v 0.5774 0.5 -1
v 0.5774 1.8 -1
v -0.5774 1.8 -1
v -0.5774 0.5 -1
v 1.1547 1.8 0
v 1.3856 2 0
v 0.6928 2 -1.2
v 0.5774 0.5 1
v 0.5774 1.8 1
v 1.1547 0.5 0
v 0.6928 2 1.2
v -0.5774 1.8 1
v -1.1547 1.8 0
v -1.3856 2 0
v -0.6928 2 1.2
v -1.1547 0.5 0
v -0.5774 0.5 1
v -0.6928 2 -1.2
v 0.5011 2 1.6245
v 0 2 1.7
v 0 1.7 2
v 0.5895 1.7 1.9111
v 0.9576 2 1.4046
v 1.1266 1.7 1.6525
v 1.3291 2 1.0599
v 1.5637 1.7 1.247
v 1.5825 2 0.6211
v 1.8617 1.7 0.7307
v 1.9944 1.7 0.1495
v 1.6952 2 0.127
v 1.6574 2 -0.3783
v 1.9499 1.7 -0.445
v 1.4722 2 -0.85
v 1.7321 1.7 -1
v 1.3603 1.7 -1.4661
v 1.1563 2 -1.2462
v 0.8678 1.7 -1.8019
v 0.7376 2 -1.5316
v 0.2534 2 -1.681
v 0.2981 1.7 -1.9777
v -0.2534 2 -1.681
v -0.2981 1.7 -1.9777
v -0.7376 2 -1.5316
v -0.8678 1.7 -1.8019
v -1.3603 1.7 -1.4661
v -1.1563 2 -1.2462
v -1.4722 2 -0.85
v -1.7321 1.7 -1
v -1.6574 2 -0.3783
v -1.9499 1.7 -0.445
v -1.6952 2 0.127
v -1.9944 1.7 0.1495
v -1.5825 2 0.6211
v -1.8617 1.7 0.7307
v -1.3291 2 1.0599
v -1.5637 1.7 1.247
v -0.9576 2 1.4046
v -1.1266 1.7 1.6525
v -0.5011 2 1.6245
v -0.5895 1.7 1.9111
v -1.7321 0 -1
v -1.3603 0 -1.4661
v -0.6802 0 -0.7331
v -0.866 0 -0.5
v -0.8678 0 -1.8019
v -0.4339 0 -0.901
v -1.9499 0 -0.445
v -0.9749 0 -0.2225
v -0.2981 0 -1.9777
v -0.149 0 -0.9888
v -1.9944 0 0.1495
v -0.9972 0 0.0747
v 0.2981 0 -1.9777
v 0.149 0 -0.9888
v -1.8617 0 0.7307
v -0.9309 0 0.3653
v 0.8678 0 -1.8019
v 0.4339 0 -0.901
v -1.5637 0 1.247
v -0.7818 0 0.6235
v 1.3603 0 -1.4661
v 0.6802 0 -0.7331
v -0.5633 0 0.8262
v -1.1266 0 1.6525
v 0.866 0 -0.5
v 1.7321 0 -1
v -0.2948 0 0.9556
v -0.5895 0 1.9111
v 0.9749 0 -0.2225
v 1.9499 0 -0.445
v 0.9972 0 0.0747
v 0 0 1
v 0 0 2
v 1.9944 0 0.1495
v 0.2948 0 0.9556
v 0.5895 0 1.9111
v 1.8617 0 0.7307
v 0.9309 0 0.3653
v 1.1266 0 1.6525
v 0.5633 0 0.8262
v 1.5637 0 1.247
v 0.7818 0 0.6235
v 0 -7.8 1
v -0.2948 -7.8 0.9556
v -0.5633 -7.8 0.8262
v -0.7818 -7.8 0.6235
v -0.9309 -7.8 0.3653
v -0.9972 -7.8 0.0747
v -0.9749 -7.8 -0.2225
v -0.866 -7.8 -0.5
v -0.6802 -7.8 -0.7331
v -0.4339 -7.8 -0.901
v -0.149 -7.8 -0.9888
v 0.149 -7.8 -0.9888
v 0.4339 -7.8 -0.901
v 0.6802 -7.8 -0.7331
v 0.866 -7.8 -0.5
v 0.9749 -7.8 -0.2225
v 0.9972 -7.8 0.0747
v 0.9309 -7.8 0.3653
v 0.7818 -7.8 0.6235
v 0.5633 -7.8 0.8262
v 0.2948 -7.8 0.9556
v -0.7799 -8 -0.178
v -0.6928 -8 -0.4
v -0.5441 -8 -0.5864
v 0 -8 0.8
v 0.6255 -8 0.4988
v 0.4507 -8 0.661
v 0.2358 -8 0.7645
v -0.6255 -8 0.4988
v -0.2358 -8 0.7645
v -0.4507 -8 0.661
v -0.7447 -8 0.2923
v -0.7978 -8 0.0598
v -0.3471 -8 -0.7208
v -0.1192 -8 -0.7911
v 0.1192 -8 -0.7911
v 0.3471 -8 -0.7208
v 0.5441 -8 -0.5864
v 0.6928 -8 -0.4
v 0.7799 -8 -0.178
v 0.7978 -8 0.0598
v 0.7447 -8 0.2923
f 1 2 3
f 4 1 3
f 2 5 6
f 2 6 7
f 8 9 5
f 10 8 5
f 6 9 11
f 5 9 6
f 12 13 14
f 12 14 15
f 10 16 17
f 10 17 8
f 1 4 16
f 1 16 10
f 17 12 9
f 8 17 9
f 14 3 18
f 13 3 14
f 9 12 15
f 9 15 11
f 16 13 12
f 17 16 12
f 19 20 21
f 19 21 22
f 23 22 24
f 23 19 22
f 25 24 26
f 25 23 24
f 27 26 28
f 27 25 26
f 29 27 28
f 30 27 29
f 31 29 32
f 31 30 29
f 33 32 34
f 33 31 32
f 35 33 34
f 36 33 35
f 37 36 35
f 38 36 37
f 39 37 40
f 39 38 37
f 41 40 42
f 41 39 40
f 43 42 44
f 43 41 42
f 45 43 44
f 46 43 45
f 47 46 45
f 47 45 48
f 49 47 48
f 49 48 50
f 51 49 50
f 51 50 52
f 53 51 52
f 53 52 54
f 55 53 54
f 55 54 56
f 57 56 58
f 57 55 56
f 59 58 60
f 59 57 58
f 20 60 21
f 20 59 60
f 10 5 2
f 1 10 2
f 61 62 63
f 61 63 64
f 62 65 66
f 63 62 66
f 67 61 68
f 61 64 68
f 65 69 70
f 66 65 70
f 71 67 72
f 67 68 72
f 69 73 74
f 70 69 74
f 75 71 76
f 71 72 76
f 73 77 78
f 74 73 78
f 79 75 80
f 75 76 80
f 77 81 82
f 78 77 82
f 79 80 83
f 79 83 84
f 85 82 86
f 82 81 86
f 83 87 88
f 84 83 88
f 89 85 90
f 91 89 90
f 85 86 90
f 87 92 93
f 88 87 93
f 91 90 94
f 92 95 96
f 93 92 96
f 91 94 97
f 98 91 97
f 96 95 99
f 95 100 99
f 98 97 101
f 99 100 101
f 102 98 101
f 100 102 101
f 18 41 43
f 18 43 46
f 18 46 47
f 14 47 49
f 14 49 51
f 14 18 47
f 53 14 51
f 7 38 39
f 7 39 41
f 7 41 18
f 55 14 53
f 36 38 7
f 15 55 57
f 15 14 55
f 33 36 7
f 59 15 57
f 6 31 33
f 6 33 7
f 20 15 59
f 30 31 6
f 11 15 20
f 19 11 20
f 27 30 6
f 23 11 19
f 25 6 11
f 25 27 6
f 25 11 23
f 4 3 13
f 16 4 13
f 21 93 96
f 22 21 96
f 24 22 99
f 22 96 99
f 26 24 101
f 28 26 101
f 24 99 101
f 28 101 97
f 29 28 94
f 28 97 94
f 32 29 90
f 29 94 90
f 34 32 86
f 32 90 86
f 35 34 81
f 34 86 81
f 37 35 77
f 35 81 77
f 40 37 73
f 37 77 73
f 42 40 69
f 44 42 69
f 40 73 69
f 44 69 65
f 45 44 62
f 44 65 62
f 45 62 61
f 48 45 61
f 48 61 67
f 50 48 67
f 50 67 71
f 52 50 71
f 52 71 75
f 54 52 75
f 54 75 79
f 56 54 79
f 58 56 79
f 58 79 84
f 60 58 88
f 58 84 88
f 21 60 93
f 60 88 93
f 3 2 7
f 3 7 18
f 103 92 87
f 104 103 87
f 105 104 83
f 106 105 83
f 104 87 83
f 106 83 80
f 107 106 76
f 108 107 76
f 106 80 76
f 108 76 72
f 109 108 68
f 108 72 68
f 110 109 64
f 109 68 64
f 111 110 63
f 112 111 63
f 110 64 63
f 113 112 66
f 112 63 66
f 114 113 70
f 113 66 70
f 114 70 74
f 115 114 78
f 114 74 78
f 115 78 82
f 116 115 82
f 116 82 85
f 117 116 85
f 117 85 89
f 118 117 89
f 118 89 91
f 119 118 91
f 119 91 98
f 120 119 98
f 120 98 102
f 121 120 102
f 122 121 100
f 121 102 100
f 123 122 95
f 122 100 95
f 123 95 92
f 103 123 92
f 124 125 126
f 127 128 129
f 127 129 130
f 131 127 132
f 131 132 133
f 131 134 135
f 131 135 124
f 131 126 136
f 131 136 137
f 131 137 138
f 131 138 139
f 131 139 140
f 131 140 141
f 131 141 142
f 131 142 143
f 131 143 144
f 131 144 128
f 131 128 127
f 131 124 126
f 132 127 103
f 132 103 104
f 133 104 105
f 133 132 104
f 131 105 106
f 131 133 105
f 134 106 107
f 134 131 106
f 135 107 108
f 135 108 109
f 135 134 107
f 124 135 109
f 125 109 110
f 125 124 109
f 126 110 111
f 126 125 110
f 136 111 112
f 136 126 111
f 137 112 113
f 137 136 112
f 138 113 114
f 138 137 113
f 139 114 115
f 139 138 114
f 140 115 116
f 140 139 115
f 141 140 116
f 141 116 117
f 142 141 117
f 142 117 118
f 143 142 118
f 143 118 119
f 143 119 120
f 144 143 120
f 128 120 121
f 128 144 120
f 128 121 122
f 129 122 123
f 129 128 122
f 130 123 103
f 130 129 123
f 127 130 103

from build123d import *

# Parameters (mm, degrees)
SKETCH1_R           = 2
BOSS_EXTRUDE1_DEPTH = 2
CHAMFER1_SIZE       = 0.3
CUT_EXTRUDE1_DEPTH  = 1.5
CHAMFER2_SIZE       = 0.2
SKETCH3_R           = 1
BOSS_EXTRUDE2_DEPTH = 8
CHAMFER3_SIZE       = 0.2


with BuildPart() as part:
    # Sketch1 → Boss-Extrude1 (new body)
    with BuildSketch(Plane(origin=(0, 0, 0), x_dir=(1, 0, 0), z_dir=(0, 1, 0))):
        with Locations(Location((0, 0, 0), (0, 0, 270))):  # turned: the seam where the file's is
            Circle(SKETCH1_R)
    extrude(amount=BOSS_EXTRUDE1_DEPTH)

    # Chamfer1
    chamfer1_edges = [part.edges().sort_by_distance(p)[0] for p in [
        (0, 2, -2),
    ]]
    chamfer(chamfer1_edges, length=CHAMFER1_SIZE)

    # Sketch2 → Cut-Extrude1 (cut)
    with BuildSketch(Plane(origin=(0, 2, 0), x_dir=(1, 0, 0), z_dir=(0, 1, 0))):
        Polygon((1.154700538, 0), (0.577350269, 1), (-0.577350269, 1), (-1.154700538, 0), (-0.577350269, -1), (0.577350269, -1), align=None)
    extrude(amount=-CUT_EXTRUDE1_DEPTH, mode=Mode.SUBTRACT)

    # Chamfer2
    chamfer2_edges = [part.edges().sort_by_distance(p)[0] for p in [
        (0.866025404, 2, 0.5),
        (0.866025404, 2, -0.5),
        (0, 2, -1),
        (-0.866025404, 2, -0.5),
        (-0.866025404, 2, 0.5),
        (0, 2, 1),
    ]]
    chamfer(chamfer2_edges, length=CHAMFER2_SIZE)

    # Sketch3 → Boss-Extrude2 (add)
    with BuildSketch(Plane.XZ):
        with Locations(Location((0, 0, 0), (0, 0, 90))):  # turned: the seam where the file's is
            Circle(SKETCH3_R)
    extrude(amount=BOSS_EXTRUDE2_DEPTH)

    # Chamfer3
    chamfer3_edges = [part.edges().sort_by_distance(p)[0] for p in [
        (0, -8, -1),
    ]]
    chamfer(chamfer3_edges, length=CHAMFER3_SIZE)


solid = part.part
